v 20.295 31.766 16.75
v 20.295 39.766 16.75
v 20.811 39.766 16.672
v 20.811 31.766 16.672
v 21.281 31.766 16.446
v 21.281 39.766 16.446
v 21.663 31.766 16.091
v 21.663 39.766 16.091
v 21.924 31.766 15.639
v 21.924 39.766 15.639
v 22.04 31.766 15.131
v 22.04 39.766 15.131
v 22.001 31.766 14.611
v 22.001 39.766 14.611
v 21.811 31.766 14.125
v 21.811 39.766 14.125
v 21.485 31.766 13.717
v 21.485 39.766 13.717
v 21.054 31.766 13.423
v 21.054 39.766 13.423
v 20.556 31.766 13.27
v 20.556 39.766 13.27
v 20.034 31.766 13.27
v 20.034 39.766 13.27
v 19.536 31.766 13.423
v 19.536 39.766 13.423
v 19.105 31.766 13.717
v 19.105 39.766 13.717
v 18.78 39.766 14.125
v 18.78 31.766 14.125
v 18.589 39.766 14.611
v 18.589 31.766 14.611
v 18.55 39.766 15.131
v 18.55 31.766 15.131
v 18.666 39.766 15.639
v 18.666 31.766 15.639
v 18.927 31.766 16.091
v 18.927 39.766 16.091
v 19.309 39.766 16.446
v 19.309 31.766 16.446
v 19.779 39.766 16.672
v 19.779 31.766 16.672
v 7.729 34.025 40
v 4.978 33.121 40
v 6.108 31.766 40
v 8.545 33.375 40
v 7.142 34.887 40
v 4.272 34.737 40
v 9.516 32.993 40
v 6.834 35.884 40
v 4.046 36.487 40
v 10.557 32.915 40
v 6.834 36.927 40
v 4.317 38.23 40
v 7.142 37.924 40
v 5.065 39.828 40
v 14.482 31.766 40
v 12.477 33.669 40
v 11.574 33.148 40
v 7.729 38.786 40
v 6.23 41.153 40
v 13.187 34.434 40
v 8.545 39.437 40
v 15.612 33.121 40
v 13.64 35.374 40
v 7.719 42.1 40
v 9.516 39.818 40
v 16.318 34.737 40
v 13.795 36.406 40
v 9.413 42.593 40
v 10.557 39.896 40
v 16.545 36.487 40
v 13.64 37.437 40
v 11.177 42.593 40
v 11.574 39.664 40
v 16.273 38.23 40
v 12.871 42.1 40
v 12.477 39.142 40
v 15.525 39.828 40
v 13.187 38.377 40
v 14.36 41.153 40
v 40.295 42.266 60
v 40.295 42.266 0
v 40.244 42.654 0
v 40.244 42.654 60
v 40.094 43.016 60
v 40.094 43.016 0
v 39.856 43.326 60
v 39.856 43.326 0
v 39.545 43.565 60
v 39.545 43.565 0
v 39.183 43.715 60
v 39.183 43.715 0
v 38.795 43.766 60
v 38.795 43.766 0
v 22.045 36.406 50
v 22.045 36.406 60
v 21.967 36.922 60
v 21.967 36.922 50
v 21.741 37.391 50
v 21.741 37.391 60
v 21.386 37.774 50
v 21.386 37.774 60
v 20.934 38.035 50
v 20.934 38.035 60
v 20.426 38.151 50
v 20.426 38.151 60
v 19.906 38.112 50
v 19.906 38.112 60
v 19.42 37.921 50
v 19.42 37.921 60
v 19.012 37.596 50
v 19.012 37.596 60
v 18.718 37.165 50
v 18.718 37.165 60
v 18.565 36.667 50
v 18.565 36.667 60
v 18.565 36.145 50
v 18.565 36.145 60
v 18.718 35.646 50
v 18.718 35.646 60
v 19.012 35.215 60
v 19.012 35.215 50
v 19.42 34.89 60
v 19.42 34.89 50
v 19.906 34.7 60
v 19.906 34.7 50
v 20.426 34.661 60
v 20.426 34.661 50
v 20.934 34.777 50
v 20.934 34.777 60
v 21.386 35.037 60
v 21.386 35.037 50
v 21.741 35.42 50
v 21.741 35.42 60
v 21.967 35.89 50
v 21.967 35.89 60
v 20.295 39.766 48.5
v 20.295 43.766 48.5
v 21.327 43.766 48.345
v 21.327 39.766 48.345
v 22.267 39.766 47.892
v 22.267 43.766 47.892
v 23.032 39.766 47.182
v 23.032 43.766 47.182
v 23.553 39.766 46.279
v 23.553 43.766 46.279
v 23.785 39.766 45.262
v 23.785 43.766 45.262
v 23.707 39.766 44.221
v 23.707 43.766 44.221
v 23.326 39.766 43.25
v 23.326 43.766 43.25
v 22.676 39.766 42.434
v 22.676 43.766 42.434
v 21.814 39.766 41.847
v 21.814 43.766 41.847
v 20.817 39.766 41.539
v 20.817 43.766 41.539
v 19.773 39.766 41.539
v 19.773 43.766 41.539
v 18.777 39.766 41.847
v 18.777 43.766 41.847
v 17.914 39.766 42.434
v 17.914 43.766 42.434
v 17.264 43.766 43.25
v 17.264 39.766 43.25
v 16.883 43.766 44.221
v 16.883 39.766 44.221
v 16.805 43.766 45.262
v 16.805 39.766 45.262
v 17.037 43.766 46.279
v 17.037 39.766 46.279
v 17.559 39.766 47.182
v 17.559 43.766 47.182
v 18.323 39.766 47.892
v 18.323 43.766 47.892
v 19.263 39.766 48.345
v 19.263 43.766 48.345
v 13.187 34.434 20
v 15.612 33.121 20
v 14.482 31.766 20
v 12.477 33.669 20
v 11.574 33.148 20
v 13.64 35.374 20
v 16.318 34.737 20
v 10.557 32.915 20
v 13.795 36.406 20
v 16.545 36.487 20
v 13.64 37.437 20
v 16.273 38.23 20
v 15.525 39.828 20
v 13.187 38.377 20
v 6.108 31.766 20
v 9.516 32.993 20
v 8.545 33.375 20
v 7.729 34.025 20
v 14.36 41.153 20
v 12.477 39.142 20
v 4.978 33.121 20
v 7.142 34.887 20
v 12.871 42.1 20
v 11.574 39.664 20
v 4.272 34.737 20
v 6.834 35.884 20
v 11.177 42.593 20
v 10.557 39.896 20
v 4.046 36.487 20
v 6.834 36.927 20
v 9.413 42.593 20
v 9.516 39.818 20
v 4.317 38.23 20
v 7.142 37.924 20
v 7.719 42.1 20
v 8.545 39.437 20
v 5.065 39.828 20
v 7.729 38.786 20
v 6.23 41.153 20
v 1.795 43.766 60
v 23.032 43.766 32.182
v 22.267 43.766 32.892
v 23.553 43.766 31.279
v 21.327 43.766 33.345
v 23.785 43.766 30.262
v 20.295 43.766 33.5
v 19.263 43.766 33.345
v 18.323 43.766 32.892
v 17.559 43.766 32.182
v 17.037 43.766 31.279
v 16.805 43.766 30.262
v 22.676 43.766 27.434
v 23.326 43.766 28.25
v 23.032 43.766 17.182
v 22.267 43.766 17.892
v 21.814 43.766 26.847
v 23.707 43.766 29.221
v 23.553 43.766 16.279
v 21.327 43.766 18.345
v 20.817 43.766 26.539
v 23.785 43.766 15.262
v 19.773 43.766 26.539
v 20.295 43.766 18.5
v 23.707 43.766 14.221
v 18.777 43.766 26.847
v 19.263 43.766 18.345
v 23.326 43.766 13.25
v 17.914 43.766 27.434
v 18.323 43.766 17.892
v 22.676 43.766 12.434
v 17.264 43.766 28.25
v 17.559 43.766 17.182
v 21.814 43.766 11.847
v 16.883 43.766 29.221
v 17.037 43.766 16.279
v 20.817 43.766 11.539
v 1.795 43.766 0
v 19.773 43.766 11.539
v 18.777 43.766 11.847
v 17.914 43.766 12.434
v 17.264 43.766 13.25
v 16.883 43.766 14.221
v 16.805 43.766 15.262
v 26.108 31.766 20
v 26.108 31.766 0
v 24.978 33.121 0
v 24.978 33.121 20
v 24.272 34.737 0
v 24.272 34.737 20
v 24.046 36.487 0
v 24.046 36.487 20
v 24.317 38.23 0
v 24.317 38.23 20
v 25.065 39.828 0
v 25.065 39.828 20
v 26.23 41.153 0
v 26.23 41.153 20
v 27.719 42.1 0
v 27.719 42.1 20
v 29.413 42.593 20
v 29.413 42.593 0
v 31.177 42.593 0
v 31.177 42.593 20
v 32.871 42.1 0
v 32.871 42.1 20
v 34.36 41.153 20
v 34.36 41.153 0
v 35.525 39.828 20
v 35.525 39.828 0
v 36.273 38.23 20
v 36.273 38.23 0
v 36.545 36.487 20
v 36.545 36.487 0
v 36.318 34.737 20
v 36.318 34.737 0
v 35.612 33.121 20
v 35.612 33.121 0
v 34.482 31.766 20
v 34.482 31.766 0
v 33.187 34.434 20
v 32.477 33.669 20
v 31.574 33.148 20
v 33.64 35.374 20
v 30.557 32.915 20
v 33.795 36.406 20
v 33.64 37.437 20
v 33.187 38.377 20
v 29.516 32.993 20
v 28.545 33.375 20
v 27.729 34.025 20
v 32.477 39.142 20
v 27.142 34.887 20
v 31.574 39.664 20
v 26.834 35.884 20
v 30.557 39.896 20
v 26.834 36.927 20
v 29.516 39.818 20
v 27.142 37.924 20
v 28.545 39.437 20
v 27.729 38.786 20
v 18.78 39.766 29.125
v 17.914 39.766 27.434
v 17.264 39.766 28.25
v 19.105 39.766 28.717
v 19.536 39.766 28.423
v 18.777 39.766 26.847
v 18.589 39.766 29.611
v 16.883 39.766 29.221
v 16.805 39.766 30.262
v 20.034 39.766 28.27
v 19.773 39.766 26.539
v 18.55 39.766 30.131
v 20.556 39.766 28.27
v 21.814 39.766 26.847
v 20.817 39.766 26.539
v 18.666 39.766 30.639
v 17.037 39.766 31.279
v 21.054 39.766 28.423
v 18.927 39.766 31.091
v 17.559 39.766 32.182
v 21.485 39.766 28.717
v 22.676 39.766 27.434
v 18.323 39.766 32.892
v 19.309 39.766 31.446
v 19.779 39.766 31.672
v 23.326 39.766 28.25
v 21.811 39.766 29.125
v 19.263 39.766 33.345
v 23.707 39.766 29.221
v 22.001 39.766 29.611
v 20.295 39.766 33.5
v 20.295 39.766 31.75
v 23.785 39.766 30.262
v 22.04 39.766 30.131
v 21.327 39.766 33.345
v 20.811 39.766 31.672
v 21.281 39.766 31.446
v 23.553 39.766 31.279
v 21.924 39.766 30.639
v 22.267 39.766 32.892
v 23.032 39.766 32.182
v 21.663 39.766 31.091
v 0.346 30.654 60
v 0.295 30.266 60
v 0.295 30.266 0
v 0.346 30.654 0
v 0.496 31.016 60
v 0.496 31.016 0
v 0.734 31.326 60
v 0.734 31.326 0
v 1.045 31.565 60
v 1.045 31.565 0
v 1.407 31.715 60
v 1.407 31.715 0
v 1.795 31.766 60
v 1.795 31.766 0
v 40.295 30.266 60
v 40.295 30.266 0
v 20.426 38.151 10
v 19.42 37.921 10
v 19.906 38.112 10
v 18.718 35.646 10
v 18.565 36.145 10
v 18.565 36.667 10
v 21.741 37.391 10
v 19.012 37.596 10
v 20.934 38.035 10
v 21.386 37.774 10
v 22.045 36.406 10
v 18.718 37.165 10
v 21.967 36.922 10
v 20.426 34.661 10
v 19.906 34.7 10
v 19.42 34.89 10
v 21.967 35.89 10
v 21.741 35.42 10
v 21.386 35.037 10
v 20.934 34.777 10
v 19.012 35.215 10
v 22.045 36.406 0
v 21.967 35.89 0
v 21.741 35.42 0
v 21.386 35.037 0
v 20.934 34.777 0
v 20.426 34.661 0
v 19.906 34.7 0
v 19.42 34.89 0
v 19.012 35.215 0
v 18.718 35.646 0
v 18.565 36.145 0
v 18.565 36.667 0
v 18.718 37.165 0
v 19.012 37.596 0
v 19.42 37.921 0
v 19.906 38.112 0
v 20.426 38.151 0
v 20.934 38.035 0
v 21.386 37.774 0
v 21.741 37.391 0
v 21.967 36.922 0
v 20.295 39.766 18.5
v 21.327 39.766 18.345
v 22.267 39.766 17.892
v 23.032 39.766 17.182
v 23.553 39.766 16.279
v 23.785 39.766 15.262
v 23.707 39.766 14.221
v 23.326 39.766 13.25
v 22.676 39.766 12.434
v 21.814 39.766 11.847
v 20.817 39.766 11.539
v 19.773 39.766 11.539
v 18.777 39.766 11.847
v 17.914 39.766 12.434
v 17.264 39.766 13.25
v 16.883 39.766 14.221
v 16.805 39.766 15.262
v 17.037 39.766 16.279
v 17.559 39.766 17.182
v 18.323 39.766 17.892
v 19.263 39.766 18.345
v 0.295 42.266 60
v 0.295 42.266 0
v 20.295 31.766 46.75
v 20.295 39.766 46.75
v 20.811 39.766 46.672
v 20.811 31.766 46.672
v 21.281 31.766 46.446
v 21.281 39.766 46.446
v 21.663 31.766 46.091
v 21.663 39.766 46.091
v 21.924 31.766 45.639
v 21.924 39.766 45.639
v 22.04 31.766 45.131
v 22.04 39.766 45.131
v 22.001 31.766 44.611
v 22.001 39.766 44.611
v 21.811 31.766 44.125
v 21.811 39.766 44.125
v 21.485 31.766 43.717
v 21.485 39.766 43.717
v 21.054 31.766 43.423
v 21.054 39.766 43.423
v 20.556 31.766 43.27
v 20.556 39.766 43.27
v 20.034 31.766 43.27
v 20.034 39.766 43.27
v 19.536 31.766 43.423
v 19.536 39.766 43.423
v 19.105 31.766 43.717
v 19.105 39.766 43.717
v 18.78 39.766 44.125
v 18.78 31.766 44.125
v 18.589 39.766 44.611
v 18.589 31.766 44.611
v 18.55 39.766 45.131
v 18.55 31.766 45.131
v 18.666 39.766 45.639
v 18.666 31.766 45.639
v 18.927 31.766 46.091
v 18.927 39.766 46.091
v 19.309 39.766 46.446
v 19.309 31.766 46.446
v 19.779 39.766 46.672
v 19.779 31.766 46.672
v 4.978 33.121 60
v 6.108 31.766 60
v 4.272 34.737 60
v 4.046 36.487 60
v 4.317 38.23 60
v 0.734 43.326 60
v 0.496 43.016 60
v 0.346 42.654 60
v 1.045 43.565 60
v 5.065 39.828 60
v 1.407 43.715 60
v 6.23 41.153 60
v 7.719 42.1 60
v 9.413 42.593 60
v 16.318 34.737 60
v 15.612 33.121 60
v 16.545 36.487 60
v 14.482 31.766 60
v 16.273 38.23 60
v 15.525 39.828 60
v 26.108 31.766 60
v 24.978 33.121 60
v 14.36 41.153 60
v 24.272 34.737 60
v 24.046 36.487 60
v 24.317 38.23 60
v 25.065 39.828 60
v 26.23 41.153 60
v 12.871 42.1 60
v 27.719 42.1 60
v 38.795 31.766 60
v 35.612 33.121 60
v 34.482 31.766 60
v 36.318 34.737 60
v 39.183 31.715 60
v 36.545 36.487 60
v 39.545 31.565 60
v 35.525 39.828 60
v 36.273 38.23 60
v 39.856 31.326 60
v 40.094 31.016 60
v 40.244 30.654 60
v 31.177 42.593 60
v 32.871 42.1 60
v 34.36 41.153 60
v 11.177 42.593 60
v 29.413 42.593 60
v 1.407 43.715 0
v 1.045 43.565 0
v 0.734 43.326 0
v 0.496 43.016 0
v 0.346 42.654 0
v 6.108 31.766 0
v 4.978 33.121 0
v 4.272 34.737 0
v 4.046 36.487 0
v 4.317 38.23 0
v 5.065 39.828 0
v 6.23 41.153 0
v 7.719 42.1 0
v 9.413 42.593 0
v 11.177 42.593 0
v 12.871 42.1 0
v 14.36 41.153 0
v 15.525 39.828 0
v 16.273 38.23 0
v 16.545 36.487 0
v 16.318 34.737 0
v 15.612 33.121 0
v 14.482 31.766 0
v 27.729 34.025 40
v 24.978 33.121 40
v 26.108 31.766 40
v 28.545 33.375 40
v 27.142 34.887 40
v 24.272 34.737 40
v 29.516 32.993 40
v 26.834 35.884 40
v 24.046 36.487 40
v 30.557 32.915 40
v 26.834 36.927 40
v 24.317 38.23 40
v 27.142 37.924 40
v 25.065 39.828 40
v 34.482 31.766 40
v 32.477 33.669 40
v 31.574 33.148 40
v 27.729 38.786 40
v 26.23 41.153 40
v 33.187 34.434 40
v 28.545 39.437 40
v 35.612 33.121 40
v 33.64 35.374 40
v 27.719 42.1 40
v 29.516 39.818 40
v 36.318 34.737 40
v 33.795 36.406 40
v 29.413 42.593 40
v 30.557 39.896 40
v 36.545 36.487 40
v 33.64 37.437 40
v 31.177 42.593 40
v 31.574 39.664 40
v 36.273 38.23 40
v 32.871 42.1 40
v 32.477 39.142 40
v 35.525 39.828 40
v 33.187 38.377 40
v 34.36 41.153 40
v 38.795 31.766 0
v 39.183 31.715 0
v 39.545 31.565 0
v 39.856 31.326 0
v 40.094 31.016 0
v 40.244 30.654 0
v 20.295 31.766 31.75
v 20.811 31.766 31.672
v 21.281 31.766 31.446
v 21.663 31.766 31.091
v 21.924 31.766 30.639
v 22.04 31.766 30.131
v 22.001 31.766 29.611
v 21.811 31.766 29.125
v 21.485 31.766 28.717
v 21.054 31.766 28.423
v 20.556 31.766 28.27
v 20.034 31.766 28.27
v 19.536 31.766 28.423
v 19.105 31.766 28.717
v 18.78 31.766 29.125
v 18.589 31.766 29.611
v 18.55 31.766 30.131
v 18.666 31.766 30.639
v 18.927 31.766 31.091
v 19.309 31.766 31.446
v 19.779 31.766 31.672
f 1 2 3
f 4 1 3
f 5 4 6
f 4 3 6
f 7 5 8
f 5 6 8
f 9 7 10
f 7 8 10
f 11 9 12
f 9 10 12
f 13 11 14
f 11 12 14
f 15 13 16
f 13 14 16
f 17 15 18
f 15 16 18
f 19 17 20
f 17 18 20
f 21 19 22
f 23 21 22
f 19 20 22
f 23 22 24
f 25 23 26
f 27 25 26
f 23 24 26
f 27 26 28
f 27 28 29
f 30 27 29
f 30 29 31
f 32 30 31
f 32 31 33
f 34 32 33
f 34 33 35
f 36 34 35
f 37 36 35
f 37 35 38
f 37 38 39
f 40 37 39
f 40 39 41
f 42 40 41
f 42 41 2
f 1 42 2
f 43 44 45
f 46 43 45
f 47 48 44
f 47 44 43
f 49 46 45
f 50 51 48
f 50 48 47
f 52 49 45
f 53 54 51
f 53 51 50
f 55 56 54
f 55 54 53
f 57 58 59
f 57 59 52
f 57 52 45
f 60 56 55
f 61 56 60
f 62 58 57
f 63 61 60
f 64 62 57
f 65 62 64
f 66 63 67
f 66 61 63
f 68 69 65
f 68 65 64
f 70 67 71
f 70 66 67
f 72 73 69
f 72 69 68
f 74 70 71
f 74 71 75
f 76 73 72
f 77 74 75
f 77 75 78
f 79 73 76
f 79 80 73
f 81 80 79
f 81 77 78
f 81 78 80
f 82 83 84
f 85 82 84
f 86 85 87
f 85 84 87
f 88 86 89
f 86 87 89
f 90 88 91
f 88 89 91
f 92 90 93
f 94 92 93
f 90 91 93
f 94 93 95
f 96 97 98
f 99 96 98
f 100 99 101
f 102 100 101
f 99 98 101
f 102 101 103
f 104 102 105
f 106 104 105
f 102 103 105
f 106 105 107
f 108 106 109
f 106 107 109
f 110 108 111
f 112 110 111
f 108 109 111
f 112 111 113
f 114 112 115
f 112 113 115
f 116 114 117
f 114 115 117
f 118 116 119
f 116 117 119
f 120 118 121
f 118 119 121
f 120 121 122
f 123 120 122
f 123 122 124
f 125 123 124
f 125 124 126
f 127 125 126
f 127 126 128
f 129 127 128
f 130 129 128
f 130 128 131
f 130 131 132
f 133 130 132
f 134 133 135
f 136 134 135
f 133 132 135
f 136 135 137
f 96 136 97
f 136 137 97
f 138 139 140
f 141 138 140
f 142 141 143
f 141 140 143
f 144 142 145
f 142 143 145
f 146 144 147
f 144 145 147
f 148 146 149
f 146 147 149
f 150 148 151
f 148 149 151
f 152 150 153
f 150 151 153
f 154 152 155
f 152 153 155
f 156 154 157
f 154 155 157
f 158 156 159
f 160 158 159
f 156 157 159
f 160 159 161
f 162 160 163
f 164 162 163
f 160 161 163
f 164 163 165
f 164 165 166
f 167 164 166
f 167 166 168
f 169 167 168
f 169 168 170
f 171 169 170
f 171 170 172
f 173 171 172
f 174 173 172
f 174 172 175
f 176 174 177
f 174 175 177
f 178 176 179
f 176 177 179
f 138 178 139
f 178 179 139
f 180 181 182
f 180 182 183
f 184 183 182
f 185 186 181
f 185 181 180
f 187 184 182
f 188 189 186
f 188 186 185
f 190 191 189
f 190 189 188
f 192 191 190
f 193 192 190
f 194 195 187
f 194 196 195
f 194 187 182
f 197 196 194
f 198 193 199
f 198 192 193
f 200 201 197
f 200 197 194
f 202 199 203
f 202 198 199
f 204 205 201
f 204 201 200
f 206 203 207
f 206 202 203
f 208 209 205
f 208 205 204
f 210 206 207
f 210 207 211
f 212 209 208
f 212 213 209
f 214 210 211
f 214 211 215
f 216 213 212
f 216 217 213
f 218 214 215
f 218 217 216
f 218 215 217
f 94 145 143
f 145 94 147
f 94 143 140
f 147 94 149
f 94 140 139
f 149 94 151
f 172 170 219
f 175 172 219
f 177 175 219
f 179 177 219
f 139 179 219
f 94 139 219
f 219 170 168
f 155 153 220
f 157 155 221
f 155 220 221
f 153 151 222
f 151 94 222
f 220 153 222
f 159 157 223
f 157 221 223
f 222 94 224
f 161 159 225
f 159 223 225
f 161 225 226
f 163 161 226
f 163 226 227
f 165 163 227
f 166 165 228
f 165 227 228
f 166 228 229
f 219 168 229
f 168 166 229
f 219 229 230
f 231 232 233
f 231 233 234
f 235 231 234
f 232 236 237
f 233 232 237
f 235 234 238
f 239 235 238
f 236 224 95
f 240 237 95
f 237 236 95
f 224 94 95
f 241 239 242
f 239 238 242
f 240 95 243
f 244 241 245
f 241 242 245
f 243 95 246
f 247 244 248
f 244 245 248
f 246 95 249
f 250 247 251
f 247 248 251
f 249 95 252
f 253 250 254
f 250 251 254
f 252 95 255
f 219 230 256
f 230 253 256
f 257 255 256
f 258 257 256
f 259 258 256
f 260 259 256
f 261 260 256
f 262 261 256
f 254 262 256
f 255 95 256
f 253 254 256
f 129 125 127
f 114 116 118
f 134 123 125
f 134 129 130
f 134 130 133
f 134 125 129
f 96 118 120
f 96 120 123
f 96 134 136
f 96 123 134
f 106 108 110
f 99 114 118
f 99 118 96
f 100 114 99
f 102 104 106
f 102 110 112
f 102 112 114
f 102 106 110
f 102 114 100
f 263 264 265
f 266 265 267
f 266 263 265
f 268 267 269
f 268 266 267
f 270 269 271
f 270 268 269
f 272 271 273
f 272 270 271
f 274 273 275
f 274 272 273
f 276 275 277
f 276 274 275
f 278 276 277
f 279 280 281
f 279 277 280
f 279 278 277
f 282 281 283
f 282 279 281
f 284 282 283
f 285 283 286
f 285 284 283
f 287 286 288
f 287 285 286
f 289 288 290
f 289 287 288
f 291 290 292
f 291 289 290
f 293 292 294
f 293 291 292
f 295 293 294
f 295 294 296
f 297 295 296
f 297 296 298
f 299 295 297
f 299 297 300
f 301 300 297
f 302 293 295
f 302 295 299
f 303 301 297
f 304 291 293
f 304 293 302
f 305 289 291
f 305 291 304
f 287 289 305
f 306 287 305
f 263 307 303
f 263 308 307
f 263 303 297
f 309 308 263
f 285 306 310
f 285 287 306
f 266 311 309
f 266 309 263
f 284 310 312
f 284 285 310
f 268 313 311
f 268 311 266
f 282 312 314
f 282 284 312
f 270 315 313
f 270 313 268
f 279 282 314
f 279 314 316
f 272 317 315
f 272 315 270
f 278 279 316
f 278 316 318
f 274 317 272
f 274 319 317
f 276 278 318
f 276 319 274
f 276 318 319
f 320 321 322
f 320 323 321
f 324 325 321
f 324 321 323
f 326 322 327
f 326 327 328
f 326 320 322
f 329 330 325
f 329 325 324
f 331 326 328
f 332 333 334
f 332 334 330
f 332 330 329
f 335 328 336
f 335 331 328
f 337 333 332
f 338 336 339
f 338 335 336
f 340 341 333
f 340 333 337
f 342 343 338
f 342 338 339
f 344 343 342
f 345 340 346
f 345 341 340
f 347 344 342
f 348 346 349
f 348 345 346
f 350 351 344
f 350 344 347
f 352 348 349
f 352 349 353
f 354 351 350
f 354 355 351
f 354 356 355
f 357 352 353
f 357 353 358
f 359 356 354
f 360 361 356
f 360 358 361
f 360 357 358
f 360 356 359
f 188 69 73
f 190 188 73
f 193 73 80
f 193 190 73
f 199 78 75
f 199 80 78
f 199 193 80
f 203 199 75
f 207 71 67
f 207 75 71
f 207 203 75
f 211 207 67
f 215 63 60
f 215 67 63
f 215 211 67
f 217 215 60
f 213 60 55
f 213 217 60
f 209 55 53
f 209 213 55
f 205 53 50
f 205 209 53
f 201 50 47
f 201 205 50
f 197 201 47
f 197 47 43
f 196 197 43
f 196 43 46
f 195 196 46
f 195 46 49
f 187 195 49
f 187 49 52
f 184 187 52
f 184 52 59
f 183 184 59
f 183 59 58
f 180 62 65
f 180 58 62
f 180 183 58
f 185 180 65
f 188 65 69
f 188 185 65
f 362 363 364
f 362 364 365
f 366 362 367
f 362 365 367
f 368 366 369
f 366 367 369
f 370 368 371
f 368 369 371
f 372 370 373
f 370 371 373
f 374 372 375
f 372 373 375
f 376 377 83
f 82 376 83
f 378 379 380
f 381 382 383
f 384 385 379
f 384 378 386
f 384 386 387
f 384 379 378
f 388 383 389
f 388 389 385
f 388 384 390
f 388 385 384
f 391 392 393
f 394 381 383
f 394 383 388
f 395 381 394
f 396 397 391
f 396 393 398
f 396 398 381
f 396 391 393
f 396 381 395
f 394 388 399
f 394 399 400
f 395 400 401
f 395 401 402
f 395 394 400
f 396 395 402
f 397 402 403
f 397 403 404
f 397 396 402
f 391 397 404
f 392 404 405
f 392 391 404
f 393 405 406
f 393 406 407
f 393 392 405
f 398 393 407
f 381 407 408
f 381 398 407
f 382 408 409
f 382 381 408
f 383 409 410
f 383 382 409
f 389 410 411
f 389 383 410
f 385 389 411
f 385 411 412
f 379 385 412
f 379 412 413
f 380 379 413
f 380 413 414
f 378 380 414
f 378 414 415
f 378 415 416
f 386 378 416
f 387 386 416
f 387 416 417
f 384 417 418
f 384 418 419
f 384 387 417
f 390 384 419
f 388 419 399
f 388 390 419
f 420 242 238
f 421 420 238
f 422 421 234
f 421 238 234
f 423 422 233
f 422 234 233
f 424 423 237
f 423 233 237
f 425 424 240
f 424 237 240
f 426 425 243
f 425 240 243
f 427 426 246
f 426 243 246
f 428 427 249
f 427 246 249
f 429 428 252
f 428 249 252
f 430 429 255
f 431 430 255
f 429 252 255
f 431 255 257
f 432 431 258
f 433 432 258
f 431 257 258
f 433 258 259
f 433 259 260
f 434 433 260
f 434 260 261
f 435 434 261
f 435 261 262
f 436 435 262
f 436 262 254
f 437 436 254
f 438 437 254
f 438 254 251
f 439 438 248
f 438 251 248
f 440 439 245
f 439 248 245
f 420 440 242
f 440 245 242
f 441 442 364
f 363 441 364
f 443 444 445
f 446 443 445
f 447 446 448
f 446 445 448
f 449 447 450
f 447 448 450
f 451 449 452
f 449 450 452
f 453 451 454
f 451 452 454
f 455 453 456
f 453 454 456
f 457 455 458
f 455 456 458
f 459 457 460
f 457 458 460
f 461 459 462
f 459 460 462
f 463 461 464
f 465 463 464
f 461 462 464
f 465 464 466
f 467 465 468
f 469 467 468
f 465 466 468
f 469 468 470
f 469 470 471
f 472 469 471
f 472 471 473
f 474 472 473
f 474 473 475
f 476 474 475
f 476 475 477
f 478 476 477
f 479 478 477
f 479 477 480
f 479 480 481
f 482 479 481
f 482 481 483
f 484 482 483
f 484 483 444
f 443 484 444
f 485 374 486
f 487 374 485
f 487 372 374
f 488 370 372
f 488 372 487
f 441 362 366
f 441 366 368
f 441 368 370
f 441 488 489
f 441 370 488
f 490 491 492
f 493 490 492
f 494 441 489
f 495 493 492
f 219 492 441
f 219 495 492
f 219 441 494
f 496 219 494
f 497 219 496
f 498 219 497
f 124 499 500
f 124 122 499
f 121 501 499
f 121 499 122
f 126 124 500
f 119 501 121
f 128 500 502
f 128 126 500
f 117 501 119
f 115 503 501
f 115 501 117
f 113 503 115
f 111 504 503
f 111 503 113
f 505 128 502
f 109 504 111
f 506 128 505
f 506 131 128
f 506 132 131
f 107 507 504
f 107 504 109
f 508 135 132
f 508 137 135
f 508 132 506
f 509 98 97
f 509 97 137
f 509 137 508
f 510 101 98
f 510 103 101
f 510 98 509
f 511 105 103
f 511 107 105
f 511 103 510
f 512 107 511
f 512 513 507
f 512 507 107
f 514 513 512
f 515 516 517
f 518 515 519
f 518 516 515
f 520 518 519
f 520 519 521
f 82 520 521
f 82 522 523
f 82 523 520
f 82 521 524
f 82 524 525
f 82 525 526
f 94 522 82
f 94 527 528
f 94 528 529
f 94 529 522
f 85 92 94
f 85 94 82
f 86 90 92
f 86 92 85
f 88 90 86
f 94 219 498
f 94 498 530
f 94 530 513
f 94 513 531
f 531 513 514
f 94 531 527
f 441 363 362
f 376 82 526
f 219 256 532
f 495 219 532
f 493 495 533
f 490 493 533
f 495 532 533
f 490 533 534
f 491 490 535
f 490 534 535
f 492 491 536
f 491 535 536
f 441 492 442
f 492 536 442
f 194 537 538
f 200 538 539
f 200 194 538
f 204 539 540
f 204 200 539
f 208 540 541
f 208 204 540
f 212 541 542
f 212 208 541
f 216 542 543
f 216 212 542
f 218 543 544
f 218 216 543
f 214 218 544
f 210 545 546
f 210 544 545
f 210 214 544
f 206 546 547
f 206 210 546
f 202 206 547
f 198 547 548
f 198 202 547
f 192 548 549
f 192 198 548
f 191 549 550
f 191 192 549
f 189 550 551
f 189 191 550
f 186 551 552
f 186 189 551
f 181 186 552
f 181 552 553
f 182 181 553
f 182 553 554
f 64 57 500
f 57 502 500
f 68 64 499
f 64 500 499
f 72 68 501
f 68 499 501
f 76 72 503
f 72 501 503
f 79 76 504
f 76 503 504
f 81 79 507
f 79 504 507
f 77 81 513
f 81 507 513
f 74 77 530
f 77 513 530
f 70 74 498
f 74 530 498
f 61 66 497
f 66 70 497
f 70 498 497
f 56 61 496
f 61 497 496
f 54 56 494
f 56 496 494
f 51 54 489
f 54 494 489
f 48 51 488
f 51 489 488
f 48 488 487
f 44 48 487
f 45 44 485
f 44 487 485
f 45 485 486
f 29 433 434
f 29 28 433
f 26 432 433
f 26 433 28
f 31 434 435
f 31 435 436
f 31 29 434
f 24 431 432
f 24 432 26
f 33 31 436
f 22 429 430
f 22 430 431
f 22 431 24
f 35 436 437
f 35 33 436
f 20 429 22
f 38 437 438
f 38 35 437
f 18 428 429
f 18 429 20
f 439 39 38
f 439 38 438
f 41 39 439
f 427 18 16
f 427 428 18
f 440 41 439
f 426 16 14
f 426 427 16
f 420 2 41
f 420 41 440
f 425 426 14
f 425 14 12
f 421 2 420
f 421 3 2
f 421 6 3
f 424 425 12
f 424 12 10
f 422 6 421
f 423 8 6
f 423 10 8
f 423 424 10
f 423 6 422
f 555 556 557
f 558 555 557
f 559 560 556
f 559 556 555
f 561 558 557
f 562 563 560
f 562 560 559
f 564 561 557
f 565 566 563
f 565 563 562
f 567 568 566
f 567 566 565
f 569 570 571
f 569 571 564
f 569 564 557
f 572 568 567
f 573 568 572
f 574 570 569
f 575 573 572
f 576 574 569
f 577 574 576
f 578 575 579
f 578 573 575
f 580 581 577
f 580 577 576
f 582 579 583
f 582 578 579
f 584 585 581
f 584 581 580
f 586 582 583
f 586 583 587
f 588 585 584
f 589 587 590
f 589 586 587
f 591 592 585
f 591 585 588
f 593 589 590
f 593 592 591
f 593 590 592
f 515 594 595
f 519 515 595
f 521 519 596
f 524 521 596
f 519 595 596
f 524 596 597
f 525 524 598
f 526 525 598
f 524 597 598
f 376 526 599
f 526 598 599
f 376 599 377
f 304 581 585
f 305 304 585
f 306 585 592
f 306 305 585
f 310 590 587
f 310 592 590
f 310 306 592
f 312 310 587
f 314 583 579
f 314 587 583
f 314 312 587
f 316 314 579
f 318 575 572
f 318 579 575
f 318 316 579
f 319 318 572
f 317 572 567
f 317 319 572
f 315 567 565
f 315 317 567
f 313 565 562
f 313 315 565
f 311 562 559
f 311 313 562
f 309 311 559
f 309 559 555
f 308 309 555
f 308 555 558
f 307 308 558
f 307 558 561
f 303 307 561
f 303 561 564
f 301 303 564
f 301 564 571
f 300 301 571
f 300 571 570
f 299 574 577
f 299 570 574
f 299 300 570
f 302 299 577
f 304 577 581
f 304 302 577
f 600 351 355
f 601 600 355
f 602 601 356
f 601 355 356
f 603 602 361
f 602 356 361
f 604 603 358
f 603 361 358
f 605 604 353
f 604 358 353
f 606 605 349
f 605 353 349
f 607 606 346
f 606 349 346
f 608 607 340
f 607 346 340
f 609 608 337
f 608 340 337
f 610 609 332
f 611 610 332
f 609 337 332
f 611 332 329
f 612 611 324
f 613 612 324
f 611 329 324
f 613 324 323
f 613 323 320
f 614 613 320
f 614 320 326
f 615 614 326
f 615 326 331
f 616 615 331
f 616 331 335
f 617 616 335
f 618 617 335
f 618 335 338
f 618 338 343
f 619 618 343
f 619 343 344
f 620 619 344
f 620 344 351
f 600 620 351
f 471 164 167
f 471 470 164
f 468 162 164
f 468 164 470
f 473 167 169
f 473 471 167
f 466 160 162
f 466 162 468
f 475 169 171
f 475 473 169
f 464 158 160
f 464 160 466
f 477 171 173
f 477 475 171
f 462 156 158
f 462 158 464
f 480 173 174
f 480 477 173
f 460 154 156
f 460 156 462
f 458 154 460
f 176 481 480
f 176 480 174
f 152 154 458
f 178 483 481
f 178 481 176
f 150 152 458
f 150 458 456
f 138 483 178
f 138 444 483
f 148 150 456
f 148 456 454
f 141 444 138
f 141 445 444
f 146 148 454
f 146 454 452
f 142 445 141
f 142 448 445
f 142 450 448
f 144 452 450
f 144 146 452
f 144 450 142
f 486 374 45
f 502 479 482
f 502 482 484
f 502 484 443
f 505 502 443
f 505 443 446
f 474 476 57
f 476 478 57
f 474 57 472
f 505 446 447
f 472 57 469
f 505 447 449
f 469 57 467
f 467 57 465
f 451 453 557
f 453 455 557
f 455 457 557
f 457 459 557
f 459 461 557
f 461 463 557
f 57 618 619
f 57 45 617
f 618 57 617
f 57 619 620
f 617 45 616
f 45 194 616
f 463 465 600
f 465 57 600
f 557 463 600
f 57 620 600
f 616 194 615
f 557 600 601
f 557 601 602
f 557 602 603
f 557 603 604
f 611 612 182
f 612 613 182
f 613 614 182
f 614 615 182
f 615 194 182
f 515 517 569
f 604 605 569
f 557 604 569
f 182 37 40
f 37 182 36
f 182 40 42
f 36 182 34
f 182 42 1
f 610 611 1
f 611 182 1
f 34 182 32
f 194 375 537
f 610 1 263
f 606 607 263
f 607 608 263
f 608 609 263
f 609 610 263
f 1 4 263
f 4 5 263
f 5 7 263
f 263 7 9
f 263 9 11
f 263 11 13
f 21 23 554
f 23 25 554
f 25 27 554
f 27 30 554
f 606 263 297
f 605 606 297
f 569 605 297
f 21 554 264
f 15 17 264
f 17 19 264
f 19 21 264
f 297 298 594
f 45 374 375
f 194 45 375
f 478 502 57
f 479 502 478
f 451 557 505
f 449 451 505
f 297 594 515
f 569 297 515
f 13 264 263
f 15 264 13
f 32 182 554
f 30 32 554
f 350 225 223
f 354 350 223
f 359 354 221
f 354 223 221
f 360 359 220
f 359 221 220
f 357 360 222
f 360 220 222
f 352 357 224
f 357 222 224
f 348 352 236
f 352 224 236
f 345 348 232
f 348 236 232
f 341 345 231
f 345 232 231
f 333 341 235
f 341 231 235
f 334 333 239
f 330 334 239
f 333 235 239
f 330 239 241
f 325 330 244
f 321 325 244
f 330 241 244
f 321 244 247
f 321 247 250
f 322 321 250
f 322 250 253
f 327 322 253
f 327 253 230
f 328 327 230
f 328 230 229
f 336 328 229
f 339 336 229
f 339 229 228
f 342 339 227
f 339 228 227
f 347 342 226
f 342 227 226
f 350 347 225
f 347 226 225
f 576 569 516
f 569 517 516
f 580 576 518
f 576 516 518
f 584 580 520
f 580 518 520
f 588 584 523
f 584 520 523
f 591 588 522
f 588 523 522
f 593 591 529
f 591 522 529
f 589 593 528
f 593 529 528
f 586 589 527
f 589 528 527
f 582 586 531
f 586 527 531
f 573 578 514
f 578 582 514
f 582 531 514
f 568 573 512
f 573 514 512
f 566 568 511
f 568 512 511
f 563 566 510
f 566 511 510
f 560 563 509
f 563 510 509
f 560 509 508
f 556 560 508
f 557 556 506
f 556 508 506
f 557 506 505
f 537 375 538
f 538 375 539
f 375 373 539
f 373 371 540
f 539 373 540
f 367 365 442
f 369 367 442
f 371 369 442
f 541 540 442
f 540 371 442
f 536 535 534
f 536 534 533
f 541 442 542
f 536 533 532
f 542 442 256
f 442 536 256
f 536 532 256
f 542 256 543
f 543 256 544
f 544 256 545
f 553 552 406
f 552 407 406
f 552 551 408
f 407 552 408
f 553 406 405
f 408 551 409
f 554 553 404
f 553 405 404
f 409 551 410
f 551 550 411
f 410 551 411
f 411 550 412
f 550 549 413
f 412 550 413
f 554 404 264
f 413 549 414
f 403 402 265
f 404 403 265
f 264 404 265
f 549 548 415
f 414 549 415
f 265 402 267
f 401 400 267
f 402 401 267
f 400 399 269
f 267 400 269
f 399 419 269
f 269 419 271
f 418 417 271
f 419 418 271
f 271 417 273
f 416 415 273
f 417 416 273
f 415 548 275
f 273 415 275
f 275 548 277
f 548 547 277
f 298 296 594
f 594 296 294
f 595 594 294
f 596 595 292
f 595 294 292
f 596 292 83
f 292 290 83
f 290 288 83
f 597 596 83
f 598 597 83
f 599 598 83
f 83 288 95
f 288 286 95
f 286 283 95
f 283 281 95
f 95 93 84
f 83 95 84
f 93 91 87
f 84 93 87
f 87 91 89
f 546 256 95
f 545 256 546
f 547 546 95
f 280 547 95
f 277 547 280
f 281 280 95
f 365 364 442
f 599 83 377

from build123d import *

# Parameters (mm, degrees)
SKETCH_1_R          = 3.5
EXTRUDE_1_DEPTH     = 60
SKETCH_2_R          = 6.25
CUT_EXTRUDE_1_DEPTH = 20
CUT_EXTRUDE_START   = -20
SKETCH_3_R          = 6.25
CUT_EXTRUDE_2_DEPTH = 20
SKETCH_4_R          = 3.5
CUT_EXTRUDE_3_DEPTH = 4
SKETCH_5_R          = 3.5
CUT_EXTRUDE_4_DEPTH = 4
SKETCH_6_R          = 1.75
CUT_EXTRUDE_5_DEPTH = 14
SKETCH_7_R          = 1.75
CUT_EXTRUDE_6_DEPTH = 10
CUT_EXTRUDE_START_2 = -10
SKETCH_8_R          = 1.75
CUT_EXTRUDE_7_DEPTH = 10


with BuildPart() as part:
    # 草图1 → 凸台-拉伸1 (new body)
    with BuildSketch(Plane.XY):
        with BuildLine():
            Line((38.795098039, 43.765686275), (1.795098039, 43.765686275))
            ThreePointArc((1.795098039, 43.765686275), (0.734437867, 43.326346446), (0.295098039, 42.265686275))
            Line((0.295098039, 42.265686275), (0.295098039, 30.265686275))
            ThreePointArc((0.295098039, 30.265686275), (0.734437867, 31.326346446), (1.795098039, 31.765686275))
            Line((1.795098039, 31.765686275), (38.795098039, 31.765686275))
            ThreePointArc((38.795098039, 31.765686275), (39.855758211, 31.326346446), (40.295098039, 30.265686275))
            Line((40.295098039, 30.265686275), (40.295098039, 42.265686275))
            ThreePointArc((40.295098039, 42.265686275), (39.855758211, 43.326346446), (38.795098039, 43.765686275))
        make_face()
        with Locations((30.295098039, 36.405686275)):
            Circle(SKETCH_1_R, mode=Mode.SUBTRACT)
        with Locations((10.295098039, 36.405686275)):
            Circle(SKETCH_1_R, mode=Mode.SUBTRACT)
    extrude(amount=EXTRUDE_1_DEPTH)

    # 草图2 → 切除-拉伸1 (cut)
    with BuildSketch(Plane.XY.offset(60)):
        with Locations((10.295098039, 36.405686275)):
            Circle(SKETCH_2_R)
        with Locations((30.295098039, 36.405686275)):
            Circle(SKETCH_2_R)
    extrude(amount=-CUT_EXTRUDE_1_DEPTH, mode=Mode.SUBTRACT)

    # 草图3 → 切除-拉伸2 (cut)
    with BuildSketch(Plane(origin=(0, 0, 0), x_dir=(-1, 0, 0), z_dir=(0, 0, -1)).offset(CUT_EXTRUDE_START)):
        with Locations((-10.295098039, 36.405686275)):
            Circle(SKETCH_3_R)
        with Locations((-30.295098039, 36.405686275)):
            Circle(SKETCH_3_R)
    extrude(amount=CUT_EXTRUDE_2_DEPTH, mode=Mode.SUBTRACT)

    # 草图4 → 切除-拉伸3 (cut)
    with BuildSketch(Plane(origin=(0, 43.765686275, 0), x_dir=(1, 0, 0), z_dir=(0, 1, 0))):
        with Locations(Location((20.295098039, -30, 0), (0, 0, 270))):
            Circle(SKETCH_4_R)
    extrude(amount=-CUT_EXTRUDE_3_DEPTH, mode=Mode.SUBTRACT)

    # 草图5 → 切除-拉伸4 (cut)
    with BuildSketch(Plane(origin=(0, 43.765686275, 0), x_dir=(1, 0, 0), z_dir=(0, 1, 0))):
        with Locations(Location((20.295098039, -15, 0), (0, 0, 270))):
            Circle(SKETCH_5_R)
        with Locations(Location((20.295098039, -45, 0), (0, 0, 270))):
            Circle(SKETCH_5_R)
    extrude(amount=-CUT_EXTRUDE_4_DEPTH, mode=Mode.SUBTRACT)

    # 草图6 → 切除-拉伸5 (cut)
    with BuildSketch(Plane(origin=(0, 39.765686275, 0), x_dir=(1, 0, 0), z_dir=(0, 1, 0))):
        with Locations(Location((20.295098039, -30, 0), (0, 0, 270))):
            Circle(SKETCH_6_R)
        with Locations(Location((20.295098039, -15, 0), (0, 0, 270))):
            Circle(SKETCH_6_R)
        with Locations(Location((20.295098039, -45, 0), (0, 0, 270))):
            Circle(SKETCH_6_R)
    extrude(amount=-CUT_EXTRUDE_5_DEPTH, mode=Mode.SUBTRACT)

    # 草图7 → 切除-拉伸6 (cut)
    with BuildSketch(Plane.XY.offset(60)):
        with Locations((20.295098039, 36.405686275)):
            Circle(SKETCH_7_R)
    extrude(amount=-CUT_EXTRUDE_6_DEPTH, mode=Mode.SUBTRACT)

    # 草图8 → 切除-拉伸7 (cut)
    with BuildSketch(Plane(origin=(0, 0, 0), x_dir=(-1, 0, 0), z_dir=(0, 0, -1)).offset(CUT_EXTRUDE_START_2)):
        with Locations(Location((-20.295098039, 36.405686275, 0), (0, 0, 180))):
            Circle(SKETCH_8_R)
    extrude(amount=CUT_EXTRUDE_7_DEPTH, mode=Mode.SUBTRACT)


solid = part.part
